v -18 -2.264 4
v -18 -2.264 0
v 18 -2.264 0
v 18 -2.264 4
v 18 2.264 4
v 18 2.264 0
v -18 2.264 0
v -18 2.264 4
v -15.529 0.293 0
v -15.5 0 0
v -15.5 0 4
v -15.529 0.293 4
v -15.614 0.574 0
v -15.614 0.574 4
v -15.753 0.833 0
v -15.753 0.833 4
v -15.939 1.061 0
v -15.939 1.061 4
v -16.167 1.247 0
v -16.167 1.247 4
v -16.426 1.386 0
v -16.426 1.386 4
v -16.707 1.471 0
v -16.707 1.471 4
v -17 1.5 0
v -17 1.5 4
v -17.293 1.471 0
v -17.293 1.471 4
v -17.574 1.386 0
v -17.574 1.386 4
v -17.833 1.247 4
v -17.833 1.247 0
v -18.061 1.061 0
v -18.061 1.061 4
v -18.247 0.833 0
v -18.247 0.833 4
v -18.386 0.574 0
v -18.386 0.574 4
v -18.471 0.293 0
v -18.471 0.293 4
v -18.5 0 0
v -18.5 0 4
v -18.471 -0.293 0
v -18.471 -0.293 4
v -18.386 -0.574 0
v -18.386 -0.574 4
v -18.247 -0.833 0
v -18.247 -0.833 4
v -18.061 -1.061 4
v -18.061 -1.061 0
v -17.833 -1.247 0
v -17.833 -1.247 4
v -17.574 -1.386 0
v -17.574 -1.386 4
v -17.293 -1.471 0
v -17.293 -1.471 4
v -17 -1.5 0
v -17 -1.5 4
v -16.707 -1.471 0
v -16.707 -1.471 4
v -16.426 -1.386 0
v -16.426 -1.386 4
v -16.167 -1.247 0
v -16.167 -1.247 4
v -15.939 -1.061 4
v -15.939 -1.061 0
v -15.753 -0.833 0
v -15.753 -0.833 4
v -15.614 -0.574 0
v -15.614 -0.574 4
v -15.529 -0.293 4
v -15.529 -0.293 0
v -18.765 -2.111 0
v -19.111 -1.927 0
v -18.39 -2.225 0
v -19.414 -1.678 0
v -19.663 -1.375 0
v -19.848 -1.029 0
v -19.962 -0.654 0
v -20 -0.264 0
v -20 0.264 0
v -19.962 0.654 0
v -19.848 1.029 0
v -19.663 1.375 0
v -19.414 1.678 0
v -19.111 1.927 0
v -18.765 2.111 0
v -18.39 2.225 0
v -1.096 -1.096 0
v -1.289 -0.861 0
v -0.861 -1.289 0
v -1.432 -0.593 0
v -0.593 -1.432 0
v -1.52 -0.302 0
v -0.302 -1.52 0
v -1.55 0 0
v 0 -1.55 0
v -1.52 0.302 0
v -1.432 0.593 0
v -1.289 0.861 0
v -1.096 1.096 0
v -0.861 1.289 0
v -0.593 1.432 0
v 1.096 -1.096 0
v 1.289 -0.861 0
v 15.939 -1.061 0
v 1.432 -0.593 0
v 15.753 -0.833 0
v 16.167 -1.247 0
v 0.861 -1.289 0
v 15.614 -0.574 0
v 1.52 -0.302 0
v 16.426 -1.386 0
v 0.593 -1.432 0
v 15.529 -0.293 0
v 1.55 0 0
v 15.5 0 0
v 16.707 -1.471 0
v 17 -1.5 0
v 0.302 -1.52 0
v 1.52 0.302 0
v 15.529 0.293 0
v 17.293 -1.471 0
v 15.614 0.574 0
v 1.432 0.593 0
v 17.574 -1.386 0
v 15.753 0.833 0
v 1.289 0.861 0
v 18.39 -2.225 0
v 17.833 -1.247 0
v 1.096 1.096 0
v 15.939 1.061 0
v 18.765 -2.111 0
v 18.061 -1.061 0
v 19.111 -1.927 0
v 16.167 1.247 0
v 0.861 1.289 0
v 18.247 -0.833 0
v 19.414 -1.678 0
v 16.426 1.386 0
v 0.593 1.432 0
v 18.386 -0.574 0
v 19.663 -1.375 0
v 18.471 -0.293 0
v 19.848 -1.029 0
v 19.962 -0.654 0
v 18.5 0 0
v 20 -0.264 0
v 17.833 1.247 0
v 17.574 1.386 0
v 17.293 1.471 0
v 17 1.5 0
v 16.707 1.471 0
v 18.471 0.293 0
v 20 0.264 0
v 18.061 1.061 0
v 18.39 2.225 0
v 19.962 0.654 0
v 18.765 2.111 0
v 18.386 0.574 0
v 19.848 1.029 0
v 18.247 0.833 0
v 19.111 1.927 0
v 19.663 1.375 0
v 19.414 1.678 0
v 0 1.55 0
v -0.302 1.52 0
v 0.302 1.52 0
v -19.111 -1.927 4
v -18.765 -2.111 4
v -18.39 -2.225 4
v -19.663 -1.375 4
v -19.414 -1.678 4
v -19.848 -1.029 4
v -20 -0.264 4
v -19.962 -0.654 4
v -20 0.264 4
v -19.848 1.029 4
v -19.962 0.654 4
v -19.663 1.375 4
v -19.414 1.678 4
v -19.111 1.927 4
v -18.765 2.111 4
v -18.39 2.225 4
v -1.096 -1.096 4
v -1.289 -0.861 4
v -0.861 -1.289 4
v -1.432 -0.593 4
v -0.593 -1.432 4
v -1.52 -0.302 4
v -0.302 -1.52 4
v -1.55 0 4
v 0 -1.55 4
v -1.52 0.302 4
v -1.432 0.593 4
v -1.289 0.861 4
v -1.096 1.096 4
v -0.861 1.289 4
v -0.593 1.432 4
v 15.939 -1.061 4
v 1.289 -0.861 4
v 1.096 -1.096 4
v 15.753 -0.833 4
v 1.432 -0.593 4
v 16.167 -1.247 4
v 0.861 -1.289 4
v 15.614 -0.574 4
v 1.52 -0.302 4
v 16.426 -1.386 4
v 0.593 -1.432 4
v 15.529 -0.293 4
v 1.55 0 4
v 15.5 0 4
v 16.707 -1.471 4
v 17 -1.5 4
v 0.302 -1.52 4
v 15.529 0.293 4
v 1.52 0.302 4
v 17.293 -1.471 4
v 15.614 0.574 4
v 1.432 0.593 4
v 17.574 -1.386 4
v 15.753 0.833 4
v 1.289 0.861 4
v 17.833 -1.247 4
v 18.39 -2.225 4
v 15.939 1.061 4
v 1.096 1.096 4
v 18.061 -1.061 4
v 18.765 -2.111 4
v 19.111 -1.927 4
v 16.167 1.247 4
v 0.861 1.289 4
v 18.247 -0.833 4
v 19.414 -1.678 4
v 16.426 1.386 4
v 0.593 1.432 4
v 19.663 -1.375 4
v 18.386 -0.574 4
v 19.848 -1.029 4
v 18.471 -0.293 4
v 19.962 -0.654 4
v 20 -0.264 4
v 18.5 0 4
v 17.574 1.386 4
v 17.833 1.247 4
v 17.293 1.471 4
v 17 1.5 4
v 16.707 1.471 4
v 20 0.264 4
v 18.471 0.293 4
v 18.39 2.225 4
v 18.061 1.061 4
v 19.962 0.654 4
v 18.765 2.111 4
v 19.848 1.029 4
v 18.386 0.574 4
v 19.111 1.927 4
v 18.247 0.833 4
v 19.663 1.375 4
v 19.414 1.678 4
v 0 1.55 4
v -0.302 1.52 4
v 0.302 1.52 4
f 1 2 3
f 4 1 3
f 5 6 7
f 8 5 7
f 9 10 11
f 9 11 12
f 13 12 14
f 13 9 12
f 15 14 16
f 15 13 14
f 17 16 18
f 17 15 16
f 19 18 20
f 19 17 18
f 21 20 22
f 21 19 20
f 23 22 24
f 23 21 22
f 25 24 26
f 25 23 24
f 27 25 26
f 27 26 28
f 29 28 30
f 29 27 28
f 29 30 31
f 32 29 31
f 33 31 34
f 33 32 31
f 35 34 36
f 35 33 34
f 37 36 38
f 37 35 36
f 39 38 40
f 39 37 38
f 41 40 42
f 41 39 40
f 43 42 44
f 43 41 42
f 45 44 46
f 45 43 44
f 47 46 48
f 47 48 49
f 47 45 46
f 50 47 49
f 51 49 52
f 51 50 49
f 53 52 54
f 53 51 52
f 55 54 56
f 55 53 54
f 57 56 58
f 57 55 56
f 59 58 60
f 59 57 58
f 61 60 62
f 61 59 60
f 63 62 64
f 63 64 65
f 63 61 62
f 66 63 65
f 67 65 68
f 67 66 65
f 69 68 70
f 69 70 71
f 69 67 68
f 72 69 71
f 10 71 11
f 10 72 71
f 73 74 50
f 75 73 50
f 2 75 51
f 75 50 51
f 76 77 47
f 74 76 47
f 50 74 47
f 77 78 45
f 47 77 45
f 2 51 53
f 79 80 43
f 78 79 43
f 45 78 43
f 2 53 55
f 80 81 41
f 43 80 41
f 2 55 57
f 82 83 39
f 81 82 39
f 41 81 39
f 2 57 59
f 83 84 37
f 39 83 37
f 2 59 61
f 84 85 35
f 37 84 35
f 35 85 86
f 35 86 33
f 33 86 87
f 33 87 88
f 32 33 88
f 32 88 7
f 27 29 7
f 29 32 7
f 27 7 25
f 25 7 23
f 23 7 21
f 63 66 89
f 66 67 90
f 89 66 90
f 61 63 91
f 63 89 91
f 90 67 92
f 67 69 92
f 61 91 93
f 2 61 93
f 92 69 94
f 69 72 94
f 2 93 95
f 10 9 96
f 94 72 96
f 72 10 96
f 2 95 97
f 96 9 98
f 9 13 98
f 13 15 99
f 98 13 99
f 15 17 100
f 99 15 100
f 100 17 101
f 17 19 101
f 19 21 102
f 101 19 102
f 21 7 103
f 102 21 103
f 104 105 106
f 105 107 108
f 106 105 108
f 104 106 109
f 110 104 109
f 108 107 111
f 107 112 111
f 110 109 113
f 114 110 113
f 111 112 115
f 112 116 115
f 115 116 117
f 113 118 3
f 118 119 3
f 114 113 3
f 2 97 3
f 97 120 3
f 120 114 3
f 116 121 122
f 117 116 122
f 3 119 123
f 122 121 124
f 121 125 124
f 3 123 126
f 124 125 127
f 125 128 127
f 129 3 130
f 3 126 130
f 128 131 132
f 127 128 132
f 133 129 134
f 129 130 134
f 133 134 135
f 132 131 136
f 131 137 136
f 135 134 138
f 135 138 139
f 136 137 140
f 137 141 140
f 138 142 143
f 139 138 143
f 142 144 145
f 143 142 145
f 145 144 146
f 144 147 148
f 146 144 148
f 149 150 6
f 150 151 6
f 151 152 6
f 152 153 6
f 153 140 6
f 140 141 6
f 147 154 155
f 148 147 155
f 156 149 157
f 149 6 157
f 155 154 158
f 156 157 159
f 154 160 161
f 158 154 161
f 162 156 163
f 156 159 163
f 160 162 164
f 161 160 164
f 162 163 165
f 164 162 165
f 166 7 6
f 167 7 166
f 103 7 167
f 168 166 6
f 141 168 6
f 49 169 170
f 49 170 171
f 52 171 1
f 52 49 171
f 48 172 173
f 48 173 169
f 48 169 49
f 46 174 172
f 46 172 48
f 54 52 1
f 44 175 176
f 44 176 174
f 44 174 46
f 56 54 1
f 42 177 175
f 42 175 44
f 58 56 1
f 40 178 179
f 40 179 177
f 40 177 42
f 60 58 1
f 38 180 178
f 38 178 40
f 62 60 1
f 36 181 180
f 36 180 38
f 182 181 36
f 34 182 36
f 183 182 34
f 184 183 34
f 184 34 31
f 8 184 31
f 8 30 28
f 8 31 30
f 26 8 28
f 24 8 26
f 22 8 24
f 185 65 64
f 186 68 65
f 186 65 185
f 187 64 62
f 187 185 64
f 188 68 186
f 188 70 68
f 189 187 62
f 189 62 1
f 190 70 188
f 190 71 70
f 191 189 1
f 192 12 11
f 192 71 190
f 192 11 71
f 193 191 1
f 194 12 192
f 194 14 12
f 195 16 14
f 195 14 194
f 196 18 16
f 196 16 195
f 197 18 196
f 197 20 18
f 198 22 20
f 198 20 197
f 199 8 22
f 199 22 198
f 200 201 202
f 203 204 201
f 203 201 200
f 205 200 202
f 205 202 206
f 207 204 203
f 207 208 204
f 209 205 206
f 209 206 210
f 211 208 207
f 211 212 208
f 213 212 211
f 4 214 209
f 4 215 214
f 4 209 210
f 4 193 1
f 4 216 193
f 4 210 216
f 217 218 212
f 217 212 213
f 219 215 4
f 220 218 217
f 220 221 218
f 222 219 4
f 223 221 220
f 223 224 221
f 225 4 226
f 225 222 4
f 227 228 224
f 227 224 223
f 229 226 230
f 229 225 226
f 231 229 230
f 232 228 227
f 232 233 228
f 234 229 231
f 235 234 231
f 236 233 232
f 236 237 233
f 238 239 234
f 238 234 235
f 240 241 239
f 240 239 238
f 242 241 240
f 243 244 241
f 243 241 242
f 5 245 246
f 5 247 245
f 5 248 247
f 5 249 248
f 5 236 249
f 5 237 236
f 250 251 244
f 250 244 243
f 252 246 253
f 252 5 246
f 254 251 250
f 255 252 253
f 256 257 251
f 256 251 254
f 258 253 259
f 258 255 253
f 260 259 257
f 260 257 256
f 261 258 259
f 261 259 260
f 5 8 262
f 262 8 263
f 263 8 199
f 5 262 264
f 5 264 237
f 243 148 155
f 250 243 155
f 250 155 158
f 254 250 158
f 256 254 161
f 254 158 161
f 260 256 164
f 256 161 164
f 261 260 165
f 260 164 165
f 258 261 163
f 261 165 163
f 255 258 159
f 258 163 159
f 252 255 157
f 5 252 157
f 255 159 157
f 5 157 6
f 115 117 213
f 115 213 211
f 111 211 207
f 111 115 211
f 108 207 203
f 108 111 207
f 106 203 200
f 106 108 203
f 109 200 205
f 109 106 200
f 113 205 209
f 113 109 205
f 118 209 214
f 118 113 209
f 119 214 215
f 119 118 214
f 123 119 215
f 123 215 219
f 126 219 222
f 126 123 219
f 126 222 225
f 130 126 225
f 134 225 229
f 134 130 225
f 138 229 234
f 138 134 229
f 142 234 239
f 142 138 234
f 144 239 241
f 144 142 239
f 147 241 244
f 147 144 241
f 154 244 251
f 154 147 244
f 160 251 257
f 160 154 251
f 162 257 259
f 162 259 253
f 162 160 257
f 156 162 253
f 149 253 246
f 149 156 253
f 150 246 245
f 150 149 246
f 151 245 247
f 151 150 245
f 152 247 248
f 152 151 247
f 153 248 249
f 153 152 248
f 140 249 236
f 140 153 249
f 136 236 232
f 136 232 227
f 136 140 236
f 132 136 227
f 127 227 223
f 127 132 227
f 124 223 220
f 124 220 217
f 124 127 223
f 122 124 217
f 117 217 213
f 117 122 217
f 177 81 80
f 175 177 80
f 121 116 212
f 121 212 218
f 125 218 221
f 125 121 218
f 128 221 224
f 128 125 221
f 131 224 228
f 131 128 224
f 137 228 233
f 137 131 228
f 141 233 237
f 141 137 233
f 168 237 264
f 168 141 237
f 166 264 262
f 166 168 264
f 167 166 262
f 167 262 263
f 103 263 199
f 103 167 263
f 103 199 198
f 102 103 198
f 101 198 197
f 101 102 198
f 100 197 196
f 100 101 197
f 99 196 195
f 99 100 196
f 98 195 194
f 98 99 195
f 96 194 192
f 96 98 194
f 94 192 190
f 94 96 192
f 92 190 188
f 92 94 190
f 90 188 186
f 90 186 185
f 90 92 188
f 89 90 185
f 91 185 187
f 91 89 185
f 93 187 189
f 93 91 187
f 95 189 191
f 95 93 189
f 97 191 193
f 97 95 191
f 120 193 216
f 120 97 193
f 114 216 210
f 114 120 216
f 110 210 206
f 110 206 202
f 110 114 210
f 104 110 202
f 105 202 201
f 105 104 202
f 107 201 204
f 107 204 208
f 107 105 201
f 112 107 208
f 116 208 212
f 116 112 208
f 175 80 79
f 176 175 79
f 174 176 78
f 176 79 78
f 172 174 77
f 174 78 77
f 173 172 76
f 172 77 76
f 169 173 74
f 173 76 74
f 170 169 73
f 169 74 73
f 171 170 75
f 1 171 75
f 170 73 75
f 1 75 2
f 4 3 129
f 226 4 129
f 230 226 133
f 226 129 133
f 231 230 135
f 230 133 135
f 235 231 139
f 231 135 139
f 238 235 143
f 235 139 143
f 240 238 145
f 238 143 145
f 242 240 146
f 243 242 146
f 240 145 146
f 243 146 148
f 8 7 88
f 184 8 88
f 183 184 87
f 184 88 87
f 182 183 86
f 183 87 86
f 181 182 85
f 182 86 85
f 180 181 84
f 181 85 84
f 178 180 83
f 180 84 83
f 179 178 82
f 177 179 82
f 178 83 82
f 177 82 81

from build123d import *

# Parameters (mm, degrees)
SKETCH1_R           = 1.55
SKETCH1_R_2         = 1.5
BOSS_EXTRUDE1_DEPTH = 4


with BuildPart() as part:
    # Sketch1 → Boss-Extrude1 (new body)
    with BuildSketch(Plane.XY):
        with BuildLine():
            Line((-18, -2.263569898), (18, -2.263569898))
            ThreePointArc((18, -2.263569898), (19.414213562, -1.677783461), (20, -0.263569898))
            Line((20, -0.263569898), (20, 0.263569898))
            ThreePointArc((20, 0.263569898), (19.414213562, 1.677783461), (18, 2.263569898))
            Line((18, 2.263569898), (-18, 2.263569898))
            ThreePointArc((-18, 2.263569898), (-19.414213562, 1.677783461), (-20, 0.263569898))
            Line((-20, 0.263569898), (-20, -0.263569898))
            ThreePointArc((-20, -0.263569898), (-19.414213562, -1.677783461), (-18, -2.263569898))
        make_face()
        Circle(SKETCH1_R, mode=Mode.SUBTRACT)
        with Locations((-17, 0)):
            Circle(SKETCH1_R_2, mode=Mode.SUBTRACT)
        with Locations(Location((17, 0, 0), (0, 0, 180))):
            Circle(SKETCH1_R_2, mode=Mode.SUBTRACT)
    extrude(amount=BOSS_EXTRUDE1_DEPTH)


solid = part.part
